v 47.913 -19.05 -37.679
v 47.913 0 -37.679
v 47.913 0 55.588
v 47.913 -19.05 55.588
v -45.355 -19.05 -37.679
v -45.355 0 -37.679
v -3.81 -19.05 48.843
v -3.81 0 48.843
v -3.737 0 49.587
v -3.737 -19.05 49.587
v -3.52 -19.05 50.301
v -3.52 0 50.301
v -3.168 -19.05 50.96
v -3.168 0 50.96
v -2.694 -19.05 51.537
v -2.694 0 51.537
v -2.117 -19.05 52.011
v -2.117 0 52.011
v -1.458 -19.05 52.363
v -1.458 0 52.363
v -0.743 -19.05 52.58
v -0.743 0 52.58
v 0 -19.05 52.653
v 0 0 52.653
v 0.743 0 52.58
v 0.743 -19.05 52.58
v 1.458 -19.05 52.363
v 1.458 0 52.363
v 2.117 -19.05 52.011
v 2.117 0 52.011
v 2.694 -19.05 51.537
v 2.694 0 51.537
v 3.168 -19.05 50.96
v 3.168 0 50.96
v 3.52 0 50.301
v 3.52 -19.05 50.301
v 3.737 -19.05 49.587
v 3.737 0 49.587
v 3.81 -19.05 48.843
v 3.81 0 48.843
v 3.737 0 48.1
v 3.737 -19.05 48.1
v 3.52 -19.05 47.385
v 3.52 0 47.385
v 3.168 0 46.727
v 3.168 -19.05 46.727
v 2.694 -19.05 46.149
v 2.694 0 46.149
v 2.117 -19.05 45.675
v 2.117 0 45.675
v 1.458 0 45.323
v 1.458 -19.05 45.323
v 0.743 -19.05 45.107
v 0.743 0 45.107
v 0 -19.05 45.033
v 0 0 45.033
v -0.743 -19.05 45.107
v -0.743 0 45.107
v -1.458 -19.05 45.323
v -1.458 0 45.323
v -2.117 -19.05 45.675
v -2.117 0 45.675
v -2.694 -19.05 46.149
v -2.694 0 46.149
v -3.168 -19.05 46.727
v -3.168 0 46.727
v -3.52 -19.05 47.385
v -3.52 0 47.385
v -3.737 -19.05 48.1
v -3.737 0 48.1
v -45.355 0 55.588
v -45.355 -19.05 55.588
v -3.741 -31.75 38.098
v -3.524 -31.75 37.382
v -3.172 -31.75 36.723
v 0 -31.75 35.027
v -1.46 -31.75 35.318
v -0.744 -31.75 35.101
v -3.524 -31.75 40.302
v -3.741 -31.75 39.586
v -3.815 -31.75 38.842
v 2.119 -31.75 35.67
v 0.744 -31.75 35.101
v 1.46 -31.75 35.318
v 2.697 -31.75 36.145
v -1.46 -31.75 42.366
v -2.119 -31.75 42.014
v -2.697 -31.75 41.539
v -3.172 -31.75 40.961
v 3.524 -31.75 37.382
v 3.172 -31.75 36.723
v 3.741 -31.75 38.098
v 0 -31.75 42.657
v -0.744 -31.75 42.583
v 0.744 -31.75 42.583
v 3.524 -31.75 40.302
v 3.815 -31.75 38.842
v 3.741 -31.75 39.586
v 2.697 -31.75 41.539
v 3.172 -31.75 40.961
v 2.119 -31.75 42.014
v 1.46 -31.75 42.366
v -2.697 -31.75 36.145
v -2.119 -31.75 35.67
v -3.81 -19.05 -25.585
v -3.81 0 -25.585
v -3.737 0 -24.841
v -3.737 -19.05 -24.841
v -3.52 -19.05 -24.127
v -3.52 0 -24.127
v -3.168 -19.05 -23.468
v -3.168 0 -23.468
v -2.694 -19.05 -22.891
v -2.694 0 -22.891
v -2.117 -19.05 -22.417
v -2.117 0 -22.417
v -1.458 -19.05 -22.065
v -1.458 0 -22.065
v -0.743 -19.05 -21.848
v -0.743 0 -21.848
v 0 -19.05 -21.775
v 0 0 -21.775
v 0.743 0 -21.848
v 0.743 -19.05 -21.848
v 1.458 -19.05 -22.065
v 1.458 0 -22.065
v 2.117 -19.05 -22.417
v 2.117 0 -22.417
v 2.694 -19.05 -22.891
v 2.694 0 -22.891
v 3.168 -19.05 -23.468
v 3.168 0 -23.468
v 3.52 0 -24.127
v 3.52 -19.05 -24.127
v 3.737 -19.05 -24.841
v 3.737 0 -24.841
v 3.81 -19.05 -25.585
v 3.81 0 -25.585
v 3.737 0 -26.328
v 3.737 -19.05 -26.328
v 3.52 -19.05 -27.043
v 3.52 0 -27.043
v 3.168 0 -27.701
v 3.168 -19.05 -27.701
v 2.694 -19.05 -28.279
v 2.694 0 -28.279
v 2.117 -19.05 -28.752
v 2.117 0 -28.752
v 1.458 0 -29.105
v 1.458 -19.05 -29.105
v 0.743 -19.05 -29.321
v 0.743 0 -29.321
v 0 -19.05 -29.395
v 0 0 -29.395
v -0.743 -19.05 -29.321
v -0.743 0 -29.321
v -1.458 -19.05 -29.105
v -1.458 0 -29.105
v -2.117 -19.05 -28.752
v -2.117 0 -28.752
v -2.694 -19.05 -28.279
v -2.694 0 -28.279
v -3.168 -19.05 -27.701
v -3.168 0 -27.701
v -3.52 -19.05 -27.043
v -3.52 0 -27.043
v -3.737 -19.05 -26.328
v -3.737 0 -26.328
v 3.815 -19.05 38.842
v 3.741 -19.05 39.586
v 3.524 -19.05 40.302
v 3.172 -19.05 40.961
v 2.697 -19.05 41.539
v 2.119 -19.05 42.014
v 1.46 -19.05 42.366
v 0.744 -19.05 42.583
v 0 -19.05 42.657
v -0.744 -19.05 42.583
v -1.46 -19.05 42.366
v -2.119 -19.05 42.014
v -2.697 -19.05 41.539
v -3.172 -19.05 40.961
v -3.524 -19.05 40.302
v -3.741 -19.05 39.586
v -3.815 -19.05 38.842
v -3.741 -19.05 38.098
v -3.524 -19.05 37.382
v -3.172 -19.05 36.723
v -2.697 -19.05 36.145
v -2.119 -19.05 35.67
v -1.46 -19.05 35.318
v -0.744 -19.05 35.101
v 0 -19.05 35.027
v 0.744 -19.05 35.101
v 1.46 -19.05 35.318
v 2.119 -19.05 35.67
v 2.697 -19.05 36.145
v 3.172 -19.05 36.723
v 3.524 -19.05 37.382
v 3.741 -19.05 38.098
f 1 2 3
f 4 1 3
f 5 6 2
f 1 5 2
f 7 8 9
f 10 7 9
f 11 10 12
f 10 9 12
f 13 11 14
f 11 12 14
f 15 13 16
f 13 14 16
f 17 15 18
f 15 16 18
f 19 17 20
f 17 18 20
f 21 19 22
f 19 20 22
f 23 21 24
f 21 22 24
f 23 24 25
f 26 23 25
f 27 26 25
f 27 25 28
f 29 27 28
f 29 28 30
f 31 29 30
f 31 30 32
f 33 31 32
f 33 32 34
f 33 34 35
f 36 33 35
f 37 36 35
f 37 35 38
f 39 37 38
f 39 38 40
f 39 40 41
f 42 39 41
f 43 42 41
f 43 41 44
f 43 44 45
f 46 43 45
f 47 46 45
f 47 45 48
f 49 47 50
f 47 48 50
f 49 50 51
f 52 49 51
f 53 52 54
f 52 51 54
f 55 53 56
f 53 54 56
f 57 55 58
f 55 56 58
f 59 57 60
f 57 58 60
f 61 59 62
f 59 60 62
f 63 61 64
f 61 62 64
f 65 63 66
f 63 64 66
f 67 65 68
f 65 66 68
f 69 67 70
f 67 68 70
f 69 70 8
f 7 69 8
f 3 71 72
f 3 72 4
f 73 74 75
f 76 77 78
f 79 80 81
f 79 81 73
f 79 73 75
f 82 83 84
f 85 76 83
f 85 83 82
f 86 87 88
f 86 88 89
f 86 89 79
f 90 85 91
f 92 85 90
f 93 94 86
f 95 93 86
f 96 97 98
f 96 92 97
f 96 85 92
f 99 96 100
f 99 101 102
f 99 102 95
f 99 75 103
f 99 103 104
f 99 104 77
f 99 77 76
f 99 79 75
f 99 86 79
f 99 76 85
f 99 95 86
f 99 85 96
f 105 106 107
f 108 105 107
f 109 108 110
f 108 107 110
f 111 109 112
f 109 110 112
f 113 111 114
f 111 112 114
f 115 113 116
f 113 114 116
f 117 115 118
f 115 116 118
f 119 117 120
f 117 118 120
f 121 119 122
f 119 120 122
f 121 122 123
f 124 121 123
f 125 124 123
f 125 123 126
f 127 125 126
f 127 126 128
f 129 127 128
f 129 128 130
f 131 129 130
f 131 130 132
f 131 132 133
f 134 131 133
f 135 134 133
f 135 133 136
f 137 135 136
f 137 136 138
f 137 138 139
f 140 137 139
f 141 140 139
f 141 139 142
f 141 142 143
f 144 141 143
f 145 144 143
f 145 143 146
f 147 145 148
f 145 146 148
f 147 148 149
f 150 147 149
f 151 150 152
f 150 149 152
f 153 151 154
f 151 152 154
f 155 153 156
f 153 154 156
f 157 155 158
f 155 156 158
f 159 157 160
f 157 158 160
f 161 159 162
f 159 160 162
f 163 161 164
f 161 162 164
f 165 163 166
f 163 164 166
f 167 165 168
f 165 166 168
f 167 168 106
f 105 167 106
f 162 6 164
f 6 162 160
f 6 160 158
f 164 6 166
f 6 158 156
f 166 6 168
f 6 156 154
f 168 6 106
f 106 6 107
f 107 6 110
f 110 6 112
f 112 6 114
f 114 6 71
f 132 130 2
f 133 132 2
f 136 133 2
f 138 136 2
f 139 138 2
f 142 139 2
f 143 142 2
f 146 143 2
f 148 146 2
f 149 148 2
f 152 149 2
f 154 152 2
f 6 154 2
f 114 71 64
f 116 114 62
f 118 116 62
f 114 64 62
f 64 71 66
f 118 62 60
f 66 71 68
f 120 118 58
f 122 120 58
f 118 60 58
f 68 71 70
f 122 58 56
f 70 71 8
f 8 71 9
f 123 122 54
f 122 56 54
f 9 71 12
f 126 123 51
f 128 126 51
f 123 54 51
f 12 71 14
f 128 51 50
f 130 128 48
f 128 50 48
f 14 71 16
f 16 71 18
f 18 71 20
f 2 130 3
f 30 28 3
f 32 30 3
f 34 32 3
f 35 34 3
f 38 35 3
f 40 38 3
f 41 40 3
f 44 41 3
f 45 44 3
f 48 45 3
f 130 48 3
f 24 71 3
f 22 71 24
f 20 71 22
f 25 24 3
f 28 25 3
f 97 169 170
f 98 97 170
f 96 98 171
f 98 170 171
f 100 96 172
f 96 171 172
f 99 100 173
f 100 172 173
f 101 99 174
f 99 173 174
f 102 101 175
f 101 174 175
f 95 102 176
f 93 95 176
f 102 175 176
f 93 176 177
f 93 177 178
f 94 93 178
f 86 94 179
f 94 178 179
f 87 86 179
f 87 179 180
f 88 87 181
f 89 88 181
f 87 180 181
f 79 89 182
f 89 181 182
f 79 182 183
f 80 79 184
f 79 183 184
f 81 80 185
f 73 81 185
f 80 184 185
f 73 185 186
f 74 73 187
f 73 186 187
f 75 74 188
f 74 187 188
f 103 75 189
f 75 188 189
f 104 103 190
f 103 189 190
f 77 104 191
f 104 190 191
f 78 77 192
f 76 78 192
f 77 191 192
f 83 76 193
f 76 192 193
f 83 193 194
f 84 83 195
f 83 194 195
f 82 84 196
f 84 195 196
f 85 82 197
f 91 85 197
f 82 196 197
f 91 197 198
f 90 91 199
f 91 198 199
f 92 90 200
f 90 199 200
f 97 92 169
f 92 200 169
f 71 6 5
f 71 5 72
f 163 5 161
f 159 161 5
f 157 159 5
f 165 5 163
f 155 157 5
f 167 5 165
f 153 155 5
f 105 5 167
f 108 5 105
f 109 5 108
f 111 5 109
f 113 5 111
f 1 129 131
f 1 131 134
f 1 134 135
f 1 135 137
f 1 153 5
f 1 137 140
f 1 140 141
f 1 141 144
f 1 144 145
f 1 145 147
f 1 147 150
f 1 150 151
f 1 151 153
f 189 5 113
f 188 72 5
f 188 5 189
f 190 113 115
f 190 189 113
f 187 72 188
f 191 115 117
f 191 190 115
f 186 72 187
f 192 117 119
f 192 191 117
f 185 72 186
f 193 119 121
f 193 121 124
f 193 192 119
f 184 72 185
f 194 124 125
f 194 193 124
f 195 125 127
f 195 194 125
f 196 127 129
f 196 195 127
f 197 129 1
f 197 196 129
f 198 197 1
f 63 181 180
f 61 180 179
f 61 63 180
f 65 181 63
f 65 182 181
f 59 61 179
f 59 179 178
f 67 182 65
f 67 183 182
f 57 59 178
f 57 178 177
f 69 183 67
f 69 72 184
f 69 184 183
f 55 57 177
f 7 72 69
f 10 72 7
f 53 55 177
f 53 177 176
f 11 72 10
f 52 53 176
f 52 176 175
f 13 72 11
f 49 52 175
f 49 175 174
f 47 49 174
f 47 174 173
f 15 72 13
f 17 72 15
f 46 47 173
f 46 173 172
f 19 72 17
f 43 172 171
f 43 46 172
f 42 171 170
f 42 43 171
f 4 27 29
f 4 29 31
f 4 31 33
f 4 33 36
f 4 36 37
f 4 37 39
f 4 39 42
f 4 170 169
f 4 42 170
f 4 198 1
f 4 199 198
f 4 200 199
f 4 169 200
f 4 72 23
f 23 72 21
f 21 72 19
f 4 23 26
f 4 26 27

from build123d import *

# Parameters (mm, degrees)
F0_W     = 93.267471
F0_H     = 93.26747
F1_DEPTH = 19.05
F2_R     = 3.814712
F3_DEPTH = 12.7
F5_D     = 7.62


with BuildPart() as f1:
    # F0 (on Front) → F1 (new body)
    with BuildSketch(Plane.XZ):
        with Locations((1.279228, 8.954607)):
            Rectangle(F0_W, F0_H)
    extrude(amount=F1_DEPTH)

    # F2 (on face) → F3 (join)
    with BuildSketch(Plane.XZ.offset(19.05)):
        with Locations((0, 38.842063)):
            Circle(F2_R)
    extrude(amount=F3_DEPTH)

    # F5 (through all)
    with Locations(Plane.XZ.offset(19.05)):
        with Locations((0, 48.843313), (0, -25.584593)):
            Hole(F5_D / 2)


solid = f1.part
